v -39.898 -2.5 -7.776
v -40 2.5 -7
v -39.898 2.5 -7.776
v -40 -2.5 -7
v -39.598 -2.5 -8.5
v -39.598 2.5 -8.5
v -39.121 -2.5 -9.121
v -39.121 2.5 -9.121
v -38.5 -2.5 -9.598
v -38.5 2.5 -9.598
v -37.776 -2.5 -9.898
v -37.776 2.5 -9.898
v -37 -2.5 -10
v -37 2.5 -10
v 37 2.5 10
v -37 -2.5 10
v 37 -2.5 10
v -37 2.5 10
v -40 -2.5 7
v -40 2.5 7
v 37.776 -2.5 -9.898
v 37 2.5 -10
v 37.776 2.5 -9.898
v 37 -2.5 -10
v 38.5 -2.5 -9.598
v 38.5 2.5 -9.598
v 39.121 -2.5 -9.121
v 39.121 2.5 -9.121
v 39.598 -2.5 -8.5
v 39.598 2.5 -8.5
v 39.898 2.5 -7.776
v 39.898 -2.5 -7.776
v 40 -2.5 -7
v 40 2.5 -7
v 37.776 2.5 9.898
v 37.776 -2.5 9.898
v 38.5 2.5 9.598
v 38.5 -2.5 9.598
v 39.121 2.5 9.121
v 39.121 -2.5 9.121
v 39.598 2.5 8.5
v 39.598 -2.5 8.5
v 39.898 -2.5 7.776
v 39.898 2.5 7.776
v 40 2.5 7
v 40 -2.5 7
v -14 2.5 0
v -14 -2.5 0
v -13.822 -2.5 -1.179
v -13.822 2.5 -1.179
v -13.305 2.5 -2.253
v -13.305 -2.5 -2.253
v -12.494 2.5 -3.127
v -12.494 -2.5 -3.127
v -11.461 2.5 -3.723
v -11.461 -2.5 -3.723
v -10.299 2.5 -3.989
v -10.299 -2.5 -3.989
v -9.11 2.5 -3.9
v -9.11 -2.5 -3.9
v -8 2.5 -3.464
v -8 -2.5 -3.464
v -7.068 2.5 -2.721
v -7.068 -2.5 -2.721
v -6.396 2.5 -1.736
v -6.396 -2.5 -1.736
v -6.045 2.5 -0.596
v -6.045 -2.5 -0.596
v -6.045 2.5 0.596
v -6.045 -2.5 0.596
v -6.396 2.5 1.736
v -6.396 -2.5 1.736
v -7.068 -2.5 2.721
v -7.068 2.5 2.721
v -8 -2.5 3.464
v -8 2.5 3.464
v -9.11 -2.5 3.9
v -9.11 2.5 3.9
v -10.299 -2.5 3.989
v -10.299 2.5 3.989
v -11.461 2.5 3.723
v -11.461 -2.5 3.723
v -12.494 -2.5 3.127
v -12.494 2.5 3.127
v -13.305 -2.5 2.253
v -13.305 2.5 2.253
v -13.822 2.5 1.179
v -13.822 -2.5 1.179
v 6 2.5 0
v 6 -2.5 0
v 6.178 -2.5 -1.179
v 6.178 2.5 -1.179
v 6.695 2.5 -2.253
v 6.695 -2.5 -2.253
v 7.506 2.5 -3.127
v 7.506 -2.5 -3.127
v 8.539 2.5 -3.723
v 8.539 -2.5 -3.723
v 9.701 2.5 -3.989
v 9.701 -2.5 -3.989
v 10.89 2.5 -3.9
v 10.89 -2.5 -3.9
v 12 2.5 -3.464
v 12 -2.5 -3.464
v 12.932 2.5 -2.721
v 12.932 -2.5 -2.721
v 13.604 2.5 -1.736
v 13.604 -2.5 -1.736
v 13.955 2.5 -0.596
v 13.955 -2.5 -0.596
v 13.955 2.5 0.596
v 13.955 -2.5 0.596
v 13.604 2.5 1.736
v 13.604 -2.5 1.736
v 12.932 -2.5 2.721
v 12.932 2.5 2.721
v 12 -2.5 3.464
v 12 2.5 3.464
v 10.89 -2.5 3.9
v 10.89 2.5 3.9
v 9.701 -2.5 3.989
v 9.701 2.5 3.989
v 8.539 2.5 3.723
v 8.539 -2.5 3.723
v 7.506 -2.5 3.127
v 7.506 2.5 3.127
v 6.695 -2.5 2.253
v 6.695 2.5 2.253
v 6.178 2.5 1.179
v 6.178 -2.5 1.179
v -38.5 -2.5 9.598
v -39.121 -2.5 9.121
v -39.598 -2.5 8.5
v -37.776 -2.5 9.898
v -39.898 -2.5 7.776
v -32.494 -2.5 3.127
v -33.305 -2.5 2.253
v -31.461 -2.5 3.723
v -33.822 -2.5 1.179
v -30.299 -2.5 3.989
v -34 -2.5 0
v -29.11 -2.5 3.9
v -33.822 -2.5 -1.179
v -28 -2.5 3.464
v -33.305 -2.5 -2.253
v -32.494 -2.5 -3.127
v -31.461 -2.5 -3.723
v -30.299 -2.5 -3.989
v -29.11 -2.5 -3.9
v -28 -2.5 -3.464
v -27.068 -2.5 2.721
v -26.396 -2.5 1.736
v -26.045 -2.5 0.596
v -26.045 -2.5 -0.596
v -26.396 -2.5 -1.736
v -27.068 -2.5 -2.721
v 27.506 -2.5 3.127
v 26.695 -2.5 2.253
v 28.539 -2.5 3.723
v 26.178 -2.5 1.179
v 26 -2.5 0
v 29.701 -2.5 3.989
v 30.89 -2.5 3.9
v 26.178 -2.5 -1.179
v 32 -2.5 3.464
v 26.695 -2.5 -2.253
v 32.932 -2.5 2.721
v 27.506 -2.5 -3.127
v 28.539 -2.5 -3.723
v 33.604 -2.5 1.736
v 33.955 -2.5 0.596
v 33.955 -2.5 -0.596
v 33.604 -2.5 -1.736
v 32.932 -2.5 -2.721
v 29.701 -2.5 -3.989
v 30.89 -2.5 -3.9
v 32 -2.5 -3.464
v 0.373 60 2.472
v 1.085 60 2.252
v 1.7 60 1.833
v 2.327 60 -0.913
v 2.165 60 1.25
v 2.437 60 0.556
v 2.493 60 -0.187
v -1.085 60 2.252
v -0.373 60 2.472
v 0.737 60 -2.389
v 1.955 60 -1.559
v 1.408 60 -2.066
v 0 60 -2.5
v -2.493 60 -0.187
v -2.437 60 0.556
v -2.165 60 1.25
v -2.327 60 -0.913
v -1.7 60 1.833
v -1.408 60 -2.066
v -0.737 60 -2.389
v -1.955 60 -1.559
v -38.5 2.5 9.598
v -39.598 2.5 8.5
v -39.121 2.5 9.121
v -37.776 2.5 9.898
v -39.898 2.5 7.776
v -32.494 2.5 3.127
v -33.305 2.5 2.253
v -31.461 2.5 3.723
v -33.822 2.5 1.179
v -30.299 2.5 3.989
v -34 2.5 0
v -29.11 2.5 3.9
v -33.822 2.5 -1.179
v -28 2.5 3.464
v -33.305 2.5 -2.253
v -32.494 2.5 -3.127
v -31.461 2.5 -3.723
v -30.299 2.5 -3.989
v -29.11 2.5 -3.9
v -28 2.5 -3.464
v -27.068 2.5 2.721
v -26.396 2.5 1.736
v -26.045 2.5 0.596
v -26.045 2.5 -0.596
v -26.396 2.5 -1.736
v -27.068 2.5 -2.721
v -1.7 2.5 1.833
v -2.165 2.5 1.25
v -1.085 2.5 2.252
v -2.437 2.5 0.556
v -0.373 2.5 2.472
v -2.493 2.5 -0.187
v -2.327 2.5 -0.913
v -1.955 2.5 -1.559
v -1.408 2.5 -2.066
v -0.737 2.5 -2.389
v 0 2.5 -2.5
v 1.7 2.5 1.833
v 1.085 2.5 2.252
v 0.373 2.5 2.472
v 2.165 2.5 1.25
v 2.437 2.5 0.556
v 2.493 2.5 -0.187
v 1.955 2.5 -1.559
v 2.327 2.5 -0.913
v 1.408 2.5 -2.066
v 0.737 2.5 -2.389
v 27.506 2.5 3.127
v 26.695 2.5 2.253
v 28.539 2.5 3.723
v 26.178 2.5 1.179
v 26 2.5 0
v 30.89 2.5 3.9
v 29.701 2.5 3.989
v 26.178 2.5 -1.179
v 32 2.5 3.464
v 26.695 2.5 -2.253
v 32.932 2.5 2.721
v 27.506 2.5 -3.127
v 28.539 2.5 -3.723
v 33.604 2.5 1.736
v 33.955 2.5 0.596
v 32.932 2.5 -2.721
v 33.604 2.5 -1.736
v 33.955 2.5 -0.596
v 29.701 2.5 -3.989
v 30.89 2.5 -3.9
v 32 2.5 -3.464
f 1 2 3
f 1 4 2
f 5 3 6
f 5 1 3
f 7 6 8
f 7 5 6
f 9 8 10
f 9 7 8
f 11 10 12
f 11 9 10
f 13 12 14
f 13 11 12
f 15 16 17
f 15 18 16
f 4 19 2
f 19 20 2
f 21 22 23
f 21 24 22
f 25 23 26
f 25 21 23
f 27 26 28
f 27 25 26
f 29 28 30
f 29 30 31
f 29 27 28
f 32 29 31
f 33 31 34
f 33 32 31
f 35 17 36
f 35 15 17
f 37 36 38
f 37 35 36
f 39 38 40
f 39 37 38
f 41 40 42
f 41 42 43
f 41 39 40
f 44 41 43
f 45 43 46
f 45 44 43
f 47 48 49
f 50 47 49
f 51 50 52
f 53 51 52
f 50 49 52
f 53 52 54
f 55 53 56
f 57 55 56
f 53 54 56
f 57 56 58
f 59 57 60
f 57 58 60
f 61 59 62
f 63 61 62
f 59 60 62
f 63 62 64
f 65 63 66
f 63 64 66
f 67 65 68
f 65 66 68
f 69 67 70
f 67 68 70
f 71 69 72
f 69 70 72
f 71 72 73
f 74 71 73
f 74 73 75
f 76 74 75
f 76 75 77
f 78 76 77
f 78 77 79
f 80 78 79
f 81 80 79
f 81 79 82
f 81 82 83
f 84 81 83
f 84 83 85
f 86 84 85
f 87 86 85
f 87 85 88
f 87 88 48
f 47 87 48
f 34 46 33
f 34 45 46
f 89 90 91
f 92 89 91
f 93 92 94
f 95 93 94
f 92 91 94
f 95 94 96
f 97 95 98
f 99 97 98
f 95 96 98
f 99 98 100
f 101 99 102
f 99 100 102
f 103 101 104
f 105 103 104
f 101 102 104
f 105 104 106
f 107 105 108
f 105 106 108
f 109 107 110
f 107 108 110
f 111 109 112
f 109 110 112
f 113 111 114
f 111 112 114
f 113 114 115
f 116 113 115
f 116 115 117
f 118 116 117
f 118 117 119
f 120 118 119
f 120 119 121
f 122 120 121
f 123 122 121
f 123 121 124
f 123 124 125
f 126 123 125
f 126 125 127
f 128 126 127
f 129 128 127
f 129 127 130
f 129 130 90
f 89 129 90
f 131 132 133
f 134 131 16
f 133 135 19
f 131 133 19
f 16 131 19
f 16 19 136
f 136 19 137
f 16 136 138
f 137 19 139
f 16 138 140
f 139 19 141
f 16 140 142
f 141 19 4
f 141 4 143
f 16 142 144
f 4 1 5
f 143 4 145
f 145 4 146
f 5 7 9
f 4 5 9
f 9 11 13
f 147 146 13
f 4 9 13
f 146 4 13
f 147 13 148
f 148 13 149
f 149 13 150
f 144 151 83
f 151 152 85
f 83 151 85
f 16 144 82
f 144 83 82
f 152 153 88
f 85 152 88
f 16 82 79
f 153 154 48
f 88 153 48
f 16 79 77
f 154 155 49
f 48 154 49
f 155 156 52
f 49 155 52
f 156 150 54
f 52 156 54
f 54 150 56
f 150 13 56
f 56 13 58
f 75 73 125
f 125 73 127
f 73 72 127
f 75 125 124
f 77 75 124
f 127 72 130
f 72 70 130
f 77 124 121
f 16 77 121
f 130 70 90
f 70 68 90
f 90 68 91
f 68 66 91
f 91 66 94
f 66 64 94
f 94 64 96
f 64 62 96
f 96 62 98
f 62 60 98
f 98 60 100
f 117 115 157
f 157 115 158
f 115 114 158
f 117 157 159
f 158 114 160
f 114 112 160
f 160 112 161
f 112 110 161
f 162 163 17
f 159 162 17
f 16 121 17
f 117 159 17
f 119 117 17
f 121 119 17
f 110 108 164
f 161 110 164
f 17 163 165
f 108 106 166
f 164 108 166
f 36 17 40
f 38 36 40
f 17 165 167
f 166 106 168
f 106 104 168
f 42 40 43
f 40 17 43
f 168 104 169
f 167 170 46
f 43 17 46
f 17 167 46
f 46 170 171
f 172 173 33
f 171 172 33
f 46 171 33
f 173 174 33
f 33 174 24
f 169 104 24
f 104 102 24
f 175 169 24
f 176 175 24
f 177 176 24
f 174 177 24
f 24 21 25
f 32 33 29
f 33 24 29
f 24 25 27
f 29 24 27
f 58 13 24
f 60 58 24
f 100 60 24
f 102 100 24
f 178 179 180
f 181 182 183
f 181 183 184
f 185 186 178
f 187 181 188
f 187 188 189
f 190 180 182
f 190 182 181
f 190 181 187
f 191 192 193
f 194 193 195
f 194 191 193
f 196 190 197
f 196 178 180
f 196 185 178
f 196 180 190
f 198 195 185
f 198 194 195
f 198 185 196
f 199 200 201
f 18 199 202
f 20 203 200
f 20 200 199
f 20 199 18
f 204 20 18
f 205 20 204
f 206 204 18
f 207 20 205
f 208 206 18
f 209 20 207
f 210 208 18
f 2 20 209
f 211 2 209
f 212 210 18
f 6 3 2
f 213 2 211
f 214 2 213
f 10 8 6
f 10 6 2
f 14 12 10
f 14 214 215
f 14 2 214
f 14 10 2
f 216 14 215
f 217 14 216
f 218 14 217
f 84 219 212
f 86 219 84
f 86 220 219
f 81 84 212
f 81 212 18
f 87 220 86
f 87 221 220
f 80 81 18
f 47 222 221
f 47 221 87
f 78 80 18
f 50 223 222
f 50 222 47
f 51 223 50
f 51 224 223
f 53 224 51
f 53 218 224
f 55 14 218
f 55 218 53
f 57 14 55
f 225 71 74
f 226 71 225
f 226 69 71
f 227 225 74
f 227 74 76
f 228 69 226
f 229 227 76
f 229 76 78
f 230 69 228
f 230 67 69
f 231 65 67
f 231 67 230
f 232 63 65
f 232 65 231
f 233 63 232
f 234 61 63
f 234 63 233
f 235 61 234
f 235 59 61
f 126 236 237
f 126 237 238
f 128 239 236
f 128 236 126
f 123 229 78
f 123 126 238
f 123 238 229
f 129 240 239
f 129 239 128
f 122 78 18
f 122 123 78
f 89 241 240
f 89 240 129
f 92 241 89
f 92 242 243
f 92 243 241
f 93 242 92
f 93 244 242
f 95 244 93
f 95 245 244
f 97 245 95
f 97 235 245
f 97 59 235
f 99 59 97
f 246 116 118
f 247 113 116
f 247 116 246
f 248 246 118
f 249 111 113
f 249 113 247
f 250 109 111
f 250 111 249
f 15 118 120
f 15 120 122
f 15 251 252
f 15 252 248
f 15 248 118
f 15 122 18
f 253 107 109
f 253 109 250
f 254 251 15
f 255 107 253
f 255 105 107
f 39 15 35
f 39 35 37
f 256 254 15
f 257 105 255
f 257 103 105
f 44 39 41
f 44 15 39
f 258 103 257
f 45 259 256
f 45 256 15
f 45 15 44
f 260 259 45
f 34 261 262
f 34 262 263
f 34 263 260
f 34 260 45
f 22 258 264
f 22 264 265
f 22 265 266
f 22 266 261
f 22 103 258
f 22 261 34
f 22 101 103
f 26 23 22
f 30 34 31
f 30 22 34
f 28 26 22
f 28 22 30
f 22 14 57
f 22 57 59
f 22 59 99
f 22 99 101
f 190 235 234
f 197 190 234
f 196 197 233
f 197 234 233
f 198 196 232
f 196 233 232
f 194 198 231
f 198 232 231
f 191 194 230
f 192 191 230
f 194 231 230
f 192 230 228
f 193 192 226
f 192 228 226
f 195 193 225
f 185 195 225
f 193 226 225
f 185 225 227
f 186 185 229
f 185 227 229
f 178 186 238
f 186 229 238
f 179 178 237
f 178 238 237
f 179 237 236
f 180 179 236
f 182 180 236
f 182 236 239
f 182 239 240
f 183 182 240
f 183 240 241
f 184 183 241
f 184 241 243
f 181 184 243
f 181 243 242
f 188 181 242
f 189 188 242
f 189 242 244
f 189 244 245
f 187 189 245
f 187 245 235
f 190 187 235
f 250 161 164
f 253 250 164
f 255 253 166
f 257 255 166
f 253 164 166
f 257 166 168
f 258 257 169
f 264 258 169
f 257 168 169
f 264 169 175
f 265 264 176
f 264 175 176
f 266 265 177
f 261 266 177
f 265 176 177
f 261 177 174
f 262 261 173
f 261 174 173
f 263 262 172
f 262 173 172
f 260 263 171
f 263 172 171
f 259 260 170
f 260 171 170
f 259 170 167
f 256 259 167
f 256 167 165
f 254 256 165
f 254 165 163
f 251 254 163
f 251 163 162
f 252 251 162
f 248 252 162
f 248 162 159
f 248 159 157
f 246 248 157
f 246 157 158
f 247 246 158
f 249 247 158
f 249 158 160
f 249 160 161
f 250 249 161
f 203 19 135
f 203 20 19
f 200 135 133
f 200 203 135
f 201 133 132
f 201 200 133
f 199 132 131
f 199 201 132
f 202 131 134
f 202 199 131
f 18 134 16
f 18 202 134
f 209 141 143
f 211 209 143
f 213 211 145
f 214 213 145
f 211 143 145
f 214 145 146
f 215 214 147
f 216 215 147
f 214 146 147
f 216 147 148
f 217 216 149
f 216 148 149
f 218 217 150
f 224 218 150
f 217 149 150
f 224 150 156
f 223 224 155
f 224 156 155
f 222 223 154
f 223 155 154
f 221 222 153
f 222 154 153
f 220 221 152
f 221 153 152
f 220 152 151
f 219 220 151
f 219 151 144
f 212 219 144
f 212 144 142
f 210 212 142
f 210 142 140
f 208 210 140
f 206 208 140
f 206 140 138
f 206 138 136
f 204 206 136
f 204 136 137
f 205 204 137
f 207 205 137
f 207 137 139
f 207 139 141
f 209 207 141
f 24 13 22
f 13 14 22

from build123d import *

# Parameters (mm, degrees)
SKETCH1_W             = 80
SKETCH1_H             = 20
BOSS_EXTRUDE1_DEPTH   = 2.5
F_8_0MM_DOWEL_HOLE1_D = 8
SKETCH6_R             = 2.5
BOSS_EXTRUDE2_DEPTH   = 60
FILLET1_R             = 3


with BuildPart() as part:
    # Sketch1 → Boss-Extrude1 (new, symmetric)
    with BuildSketch(Plane(origin=(0, 0, 0), x_dir=(1, 0, 0), z_dir=(0, 1, 0))):
        Rectangle(SKETCH1_W, SKETCH1_H)
    extrude(amount=BOSS_EXTRUDE1_DEPTH, both=True)

    # Ø8.0mm Dowel Hole1 (through all)
    with Locations(Plane(origin=(0, 2.5, 0), x_dir=(1, 0, 0), z_dir=(0, 1, 0))):
        with Locations((-30, 0), (-10, 0), (10, 0), (30, 0)):
            Hole(F_8_0MM_DOWEL_HOLE1_D / 2)

    # Sketch6 → Boss-Extrude2 (add)
    with BuildSketch(Plane(origin=(0, 0, 0), x_dir=(1, 0, 0), z_dir=(0, 1, 0))):
        with Locations(Location((0, 0, 0), (0, 0, 90))):
            Circle(SKETCH6_R)
    extrude(amount=BOSS_EXTRUDE2_DEPTH)

    # Fillet1
    fillet1_edges = [part.edges().sort_by_distance(p)[0] for p in [
        (40, 0, 10),
        (-40, 0, 10),
        (-40, 0, -10),
        (40, 0, -10),
    ]]
    fillet(fillet1_edges, radius=FILLET1_R)


solid = part.part
